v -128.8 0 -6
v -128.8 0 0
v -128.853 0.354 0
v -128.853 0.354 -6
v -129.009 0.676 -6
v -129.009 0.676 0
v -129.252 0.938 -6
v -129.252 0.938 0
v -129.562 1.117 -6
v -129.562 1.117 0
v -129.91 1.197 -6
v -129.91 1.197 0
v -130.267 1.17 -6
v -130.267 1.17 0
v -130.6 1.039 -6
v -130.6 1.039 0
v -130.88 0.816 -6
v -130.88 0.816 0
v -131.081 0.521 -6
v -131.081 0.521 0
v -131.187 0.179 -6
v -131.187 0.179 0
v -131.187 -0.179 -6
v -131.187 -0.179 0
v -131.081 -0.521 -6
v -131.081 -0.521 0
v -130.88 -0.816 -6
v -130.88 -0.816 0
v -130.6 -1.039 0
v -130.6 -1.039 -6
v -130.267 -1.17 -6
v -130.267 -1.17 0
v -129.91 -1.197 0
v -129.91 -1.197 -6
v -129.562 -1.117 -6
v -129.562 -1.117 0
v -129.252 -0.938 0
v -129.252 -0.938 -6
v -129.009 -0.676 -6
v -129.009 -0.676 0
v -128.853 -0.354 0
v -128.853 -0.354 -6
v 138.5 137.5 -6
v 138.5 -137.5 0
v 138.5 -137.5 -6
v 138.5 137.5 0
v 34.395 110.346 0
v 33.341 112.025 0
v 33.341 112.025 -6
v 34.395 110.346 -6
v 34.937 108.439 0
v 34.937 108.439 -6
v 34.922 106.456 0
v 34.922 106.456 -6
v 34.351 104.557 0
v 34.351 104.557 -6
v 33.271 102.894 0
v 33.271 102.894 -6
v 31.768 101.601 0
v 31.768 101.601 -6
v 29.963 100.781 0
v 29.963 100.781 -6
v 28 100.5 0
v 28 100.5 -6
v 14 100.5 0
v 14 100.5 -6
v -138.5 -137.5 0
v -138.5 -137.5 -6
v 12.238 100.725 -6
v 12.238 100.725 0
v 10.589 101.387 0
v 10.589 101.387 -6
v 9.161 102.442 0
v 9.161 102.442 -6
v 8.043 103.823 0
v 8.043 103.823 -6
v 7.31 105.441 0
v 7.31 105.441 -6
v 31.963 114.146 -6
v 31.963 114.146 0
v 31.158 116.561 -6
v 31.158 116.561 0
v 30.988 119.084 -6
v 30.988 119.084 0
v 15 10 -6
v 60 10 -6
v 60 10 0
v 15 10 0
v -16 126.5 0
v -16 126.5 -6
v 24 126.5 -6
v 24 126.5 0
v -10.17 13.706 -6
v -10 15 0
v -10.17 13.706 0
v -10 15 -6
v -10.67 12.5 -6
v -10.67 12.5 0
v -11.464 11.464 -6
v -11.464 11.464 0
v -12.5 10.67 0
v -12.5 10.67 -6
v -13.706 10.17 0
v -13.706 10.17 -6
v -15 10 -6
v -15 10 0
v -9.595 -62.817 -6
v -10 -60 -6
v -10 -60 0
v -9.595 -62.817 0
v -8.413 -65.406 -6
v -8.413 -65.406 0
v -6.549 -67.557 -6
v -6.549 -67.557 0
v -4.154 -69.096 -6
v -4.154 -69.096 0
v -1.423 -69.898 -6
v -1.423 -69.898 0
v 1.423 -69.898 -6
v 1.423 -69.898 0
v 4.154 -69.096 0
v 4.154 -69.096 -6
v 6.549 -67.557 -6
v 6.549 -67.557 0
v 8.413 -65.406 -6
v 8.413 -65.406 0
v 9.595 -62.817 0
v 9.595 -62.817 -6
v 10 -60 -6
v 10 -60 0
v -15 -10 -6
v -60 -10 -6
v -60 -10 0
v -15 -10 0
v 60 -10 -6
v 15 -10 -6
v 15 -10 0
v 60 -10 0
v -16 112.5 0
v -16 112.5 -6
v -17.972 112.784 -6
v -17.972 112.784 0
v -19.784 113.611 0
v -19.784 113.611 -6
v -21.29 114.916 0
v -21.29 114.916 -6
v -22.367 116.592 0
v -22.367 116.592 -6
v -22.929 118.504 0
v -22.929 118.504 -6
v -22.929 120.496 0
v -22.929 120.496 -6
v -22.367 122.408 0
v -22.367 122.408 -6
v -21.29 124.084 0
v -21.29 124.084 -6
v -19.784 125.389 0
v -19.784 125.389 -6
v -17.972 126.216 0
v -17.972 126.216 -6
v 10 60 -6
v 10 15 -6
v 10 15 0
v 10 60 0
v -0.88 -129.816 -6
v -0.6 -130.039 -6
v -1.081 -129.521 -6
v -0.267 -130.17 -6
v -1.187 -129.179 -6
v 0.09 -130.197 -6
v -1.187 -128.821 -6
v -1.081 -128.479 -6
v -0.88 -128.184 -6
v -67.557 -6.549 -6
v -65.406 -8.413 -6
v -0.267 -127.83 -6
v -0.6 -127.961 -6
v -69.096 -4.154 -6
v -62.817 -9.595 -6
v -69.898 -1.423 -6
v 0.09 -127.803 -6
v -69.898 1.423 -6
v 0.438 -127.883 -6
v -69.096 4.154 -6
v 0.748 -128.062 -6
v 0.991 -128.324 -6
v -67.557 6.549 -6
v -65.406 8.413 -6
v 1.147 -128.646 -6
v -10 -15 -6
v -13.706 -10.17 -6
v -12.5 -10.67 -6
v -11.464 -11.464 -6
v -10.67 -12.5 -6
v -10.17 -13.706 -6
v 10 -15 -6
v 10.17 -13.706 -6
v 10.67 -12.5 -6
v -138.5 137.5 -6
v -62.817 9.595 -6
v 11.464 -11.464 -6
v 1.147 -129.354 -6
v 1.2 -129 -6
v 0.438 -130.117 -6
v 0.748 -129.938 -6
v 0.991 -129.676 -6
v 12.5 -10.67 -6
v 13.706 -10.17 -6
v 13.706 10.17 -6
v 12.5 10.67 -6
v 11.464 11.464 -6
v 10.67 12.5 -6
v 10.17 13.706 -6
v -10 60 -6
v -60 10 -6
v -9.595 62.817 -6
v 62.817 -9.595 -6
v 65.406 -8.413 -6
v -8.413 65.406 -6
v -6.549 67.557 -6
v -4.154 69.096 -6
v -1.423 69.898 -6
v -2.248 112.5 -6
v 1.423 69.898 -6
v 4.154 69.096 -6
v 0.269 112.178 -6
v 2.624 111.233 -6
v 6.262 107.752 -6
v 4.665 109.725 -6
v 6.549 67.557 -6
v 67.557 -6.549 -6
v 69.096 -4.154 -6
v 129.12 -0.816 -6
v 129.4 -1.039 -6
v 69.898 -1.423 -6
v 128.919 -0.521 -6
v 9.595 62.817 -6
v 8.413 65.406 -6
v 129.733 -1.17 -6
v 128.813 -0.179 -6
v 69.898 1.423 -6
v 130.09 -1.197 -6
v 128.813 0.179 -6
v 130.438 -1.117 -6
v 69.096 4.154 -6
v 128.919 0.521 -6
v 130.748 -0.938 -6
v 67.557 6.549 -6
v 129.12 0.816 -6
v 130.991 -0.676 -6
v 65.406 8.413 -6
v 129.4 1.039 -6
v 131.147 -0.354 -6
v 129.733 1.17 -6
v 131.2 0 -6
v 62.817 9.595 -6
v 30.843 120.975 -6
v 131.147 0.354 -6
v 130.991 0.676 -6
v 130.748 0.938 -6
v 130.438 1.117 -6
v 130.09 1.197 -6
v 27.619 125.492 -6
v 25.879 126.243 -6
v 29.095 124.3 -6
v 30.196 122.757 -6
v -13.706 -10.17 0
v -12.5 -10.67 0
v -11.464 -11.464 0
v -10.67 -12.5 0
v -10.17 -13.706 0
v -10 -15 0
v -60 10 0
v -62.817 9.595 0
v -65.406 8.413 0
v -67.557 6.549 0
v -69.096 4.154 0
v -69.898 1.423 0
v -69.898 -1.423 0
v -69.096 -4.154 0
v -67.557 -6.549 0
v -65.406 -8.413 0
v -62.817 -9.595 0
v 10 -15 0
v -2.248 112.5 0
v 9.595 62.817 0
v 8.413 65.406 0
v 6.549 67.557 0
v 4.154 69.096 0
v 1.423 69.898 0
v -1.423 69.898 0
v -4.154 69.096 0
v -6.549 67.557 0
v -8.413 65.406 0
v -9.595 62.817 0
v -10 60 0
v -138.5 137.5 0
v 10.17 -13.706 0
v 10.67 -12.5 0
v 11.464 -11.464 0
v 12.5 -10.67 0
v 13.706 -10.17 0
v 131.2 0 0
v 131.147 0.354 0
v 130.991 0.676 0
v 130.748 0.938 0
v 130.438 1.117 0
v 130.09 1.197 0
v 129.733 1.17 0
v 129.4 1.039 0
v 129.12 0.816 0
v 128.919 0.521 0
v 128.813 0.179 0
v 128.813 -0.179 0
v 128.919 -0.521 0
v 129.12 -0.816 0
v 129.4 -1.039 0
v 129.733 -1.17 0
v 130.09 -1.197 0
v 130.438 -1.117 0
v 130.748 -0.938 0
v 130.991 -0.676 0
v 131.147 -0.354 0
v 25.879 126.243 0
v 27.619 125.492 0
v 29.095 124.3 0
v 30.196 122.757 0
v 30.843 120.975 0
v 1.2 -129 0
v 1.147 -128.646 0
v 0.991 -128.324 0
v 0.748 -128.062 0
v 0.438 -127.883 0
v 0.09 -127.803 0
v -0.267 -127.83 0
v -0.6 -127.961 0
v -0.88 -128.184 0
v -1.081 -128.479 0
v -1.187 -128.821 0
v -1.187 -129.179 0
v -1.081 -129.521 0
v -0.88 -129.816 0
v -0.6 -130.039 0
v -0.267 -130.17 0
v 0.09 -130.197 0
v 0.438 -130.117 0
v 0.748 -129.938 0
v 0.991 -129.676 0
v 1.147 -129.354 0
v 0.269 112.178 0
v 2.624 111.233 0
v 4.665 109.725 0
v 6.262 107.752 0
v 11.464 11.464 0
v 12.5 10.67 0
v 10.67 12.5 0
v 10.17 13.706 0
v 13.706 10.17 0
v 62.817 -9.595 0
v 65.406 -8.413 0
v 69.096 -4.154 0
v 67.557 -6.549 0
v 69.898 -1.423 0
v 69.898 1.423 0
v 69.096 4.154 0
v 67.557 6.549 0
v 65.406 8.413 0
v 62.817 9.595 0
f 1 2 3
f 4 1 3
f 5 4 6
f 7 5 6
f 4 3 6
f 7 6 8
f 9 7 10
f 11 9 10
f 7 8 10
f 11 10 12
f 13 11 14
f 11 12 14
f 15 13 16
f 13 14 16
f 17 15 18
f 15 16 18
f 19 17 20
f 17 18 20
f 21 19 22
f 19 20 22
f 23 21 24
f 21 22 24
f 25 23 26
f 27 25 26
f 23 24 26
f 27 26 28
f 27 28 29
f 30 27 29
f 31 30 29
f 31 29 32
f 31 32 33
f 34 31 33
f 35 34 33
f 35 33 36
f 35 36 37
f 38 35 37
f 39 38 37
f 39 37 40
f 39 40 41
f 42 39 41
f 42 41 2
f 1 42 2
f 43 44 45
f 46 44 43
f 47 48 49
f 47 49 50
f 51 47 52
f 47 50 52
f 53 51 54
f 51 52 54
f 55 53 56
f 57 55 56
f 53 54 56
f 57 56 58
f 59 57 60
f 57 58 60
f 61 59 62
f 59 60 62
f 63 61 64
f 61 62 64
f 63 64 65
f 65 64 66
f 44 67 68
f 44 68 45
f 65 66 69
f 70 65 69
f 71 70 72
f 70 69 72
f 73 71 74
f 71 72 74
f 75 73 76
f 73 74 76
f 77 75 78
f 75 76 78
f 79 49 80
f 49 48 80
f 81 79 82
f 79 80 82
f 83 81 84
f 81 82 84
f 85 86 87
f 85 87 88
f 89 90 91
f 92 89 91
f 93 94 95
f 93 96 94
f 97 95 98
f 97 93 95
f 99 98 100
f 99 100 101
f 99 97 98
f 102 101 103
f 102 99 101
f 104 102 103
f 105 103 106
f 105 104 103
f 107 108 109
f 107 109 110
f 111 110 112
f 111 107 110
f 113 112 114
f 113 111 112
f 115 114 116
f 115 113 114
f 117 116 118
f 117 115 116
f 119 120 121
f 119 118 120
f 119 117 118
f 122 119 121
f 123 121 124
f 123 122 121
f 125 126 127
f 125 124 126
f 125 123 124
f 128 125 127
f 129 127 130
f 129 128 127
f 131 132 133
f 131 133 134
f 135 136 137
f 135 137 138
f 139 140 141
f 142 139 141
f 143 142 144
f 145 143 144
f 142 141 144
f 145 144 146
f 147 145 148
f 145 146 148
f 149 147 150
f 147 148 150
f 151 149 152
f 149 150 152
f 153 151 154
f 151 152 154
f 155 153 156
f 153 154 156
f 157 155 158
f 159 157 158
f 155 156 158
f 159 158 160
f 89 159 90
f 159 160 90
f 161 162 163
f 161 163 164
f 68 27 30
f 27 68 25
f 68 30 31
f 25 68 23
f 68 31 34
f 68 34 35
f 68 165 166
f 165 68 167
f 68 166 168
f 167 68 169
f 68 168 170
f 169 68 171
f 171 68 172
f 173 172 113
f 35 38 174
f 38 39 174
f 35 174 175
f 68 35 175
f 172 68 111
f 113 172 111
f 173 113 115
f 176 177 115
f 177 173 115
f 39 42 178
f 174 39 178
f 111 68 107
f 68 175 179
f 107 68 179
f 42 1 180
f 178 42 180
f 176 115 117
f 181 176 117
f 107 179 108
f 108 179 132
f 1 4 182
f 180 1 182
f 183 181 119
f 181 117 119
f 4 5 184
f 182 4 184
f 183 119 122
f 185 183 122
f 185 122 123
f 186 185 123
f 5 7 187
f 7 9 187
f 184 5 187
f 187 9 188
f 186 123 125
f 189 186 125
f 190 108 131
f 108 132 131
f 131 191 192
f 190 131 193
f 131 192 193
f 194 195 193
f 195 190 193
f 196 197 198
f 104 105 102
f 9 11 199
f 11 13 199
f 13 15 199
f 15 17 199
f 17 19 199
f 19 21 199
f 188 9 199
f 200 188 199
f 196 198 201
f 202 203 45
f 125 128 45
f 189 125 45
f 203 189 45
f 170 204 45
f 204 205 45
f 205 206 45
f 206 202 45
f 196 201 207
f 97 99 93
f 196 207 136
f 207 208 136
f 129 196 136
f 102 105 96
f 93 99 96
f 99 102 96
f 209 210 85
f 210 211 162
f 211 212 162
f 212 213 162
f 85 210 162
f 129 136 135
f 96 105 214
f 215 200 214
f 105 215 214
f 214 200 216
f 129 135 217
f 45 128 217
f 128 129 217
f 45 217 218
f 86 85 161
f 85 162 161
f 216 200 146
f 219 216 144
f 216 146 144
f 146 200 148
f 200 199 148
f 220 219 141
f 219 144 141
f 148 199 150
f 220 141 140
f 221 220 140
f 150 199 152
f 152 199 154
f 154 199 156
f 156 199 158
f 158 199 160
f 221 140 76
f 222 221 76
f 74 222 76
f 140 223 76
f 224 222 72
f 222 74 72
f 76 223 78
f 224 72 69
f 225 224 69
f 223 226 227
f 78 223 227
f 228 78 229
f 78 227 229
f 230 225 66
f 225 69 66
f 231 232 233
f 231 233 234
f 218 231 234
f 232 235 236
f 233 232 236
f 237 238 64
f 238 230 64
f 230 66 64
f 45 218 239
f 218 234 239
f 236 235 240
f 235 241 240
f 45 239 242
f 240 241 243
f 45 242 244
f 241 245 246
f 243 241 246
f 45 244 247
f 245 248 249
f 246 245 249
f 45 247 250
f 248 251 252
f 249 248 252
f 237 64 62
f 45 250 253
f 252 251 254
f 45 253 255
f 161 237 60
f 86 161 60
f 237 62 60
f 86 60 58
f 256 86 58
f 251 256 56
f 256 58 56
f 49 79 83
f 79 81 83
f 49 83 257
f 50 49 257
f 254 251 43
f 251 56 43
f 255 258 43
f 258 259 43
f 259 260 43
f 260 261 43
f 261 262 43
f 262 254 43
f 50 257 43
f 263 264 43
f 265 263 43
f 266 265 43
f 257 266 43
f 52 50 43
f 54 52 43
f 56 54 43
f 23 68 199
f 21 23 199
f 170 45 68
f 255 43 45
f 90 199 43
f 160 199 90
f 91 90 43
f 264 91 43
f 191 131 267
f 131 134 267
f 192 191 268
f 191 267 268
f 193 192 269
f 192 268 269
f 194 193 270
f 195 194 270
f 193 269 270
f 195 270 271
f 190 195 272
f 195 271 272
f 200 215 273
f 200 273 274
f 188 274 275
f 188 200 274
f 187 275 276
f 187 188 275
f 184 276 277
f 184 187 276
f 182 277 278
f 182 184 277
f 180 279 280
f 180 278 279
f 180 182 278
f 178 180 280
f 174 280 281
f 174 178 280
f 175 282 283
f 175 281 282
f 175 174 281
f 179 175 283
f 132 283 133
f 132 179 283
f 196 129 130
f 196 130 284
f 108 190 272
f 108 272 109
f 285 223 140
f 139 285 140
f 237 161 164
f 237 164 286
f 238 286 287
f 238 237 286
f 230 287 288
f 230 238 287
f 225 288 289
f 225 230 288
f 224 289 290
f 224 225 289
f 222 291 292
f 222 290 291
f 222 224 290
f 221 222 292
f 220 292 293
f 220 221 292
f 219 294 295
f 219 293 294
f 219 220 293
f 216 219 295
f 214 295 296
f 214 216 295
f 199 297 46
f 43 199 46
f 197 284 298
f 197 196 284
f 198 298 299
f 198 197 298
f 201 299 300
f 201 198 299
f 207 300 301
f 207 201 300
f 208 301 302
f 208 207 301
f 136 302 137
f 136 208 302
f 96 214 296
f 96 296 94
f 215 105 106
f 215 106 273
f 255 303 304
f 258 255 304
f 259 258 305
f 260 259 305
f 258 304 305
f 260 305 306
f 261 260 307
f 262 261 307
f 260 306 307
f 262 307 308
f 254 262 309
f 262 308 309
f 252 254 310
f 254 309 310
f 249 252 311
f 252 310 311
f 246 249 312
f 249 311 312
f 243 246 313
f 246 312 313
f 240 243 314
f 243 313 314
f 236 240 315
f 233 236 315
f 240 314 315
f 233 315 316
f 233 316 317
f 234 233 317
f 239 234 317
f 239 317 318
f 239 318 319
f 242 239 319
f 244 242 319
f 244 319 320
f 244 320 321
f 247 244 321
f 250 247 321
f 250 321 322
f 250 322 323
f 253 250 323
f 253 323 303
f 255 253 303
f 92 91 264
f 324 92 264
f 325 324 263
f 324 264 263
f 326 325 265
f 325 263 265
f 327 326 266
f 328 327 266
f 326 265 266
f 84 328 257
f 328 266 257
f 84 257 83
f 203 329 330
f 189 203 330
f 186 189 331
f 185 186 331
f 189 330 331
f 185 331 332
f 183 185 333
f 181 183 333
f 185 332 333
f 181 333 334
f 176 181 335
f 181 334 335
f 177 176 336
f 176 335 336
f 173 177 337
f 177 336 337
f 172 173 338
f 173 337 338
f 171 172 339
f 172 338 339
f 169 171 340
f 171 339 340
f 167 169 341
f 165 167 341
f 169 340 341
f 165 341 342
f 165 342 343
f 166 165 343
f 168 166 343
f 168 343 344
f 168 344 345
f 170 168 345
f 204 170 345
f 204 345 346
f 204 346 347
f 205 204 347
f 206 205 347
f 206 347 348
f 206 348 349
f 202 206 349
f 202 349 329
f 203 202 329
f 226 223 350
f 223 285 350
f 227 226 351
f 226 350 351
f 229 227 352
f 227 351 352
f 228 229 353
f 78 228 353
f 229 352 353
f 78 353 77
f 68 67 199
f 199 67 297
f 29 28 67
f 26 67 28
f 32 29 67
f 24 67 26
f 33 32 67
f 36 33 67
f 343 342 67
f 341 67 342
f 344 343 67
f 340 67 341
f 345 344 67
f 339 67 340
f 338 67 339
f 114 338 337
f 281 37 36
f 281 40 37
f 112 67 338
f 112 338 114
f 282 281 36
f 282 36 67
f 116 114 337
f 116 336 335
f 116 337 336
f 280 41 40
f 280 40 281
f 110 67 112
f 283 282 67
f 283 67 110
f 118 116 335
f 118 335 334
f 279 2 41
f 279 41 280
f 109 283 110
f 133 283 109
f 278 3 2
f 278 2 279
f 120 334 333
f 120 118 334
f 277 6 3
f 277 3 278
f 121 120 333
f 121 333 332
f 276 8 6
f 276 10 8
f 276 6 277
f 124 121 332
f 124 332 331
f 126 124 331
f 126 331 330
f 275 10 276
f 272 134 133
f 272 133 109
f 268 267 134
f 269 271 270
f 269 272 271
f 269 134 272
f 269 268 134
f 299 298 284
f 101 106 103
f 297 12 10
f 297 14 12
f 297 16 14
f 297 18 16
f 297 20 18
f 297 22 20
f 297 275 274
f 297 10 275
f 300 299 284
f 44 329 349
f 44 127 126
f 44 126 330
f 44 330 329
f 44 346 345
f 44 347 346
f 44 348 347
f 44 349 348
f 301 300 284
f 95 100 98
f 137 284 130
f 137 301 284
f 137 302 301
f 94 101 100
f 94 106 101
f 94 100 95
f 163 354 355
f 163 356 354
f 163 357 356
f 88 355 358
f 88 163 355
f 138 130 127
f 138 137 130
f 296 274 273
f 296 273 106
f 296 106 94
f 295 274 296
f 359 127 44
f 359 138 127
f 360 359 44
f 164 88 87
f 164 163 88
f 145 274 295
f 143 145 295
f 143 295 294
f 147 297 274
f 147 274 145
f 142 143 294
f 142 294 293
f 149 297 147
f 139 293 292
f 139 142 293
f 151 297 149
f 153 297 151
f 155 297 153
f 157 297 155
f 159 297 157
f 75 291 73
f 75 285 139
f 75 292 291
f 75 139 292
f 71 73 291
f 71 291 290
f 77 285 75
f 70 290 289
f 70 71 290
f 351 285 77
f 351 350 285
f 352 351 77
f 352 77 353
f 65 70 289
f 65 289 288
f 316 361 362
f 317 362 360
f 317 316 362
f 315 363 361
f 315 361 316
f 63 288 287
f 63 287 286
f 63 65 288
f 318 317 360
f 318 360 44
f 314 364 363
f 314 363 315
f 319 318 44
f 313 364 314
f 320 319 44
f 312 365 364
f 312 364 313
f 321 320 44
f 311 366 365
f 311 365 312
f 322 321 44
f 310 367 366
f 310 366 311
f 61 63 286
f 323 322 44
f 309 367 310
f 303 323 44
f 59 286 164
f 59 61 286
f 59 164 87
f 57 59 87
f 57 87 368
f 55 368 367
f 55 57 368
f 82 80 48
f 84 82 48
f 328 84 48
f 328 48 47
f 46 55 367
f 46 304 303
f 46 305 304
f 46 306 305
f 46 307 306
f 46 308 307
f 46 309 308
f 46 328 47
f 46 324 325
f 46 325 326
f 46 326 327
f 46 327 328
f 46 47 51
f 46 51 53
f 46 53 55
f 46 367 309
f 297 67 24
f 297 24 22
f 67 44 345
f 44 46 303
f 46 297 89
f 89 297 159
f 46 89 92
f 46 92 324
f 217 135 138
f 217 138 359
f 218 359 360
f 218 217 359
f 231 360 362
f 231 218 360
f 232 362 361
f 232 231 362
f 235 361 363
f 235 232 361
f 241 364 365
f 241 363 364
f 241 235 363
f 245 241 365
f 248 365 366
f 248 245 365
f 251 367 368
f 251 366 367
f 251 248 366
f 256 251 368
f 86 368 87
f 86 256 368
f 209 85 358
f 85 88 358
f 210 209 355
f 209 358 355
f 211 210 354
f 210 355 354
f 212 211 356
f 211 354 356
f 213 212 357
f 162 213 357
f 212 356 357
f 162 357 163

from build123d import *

# Parameters (mm, degrees)
CROQUIS1_W                   = 277
CROQUIS1_H                   = 275
BRIDA_BASE1_DEPTH            = 6
CORTAR_EXTRUIR4_DEPTH        = 10
REDONDEO2_R                  = 10
TALADRO_DE_MARGEN_PARA_M21_D = 2.4
CORTAR_EXTRUIR5_DEPTH        = 196.254961669
MATRIZC1_COUNT               = 4
REDONDEO3_R                  = 5


# Sheet-metal steps are written as plain solids
with BuildPart() as part:
    # Croquis1 → Brida base1 (new body)
    with BuildSketch(Plane.XY):
        Rectangle(CROQUIS1_W, CROQUIS1_H)
    extrude(amount=-BRIDA_BASE1_DEPTH)

    # Croquis6 → Cortar-Extruir4 (cut)
    with BuildSketch(Plane(origin=(0, 0, -6), x_dir=(-1, 0, 0), z_dir=(0, 0, -1))):
        with BuildLine():
            Line((-9.101020514, 112.5), (16, 112.5))
            ThreePointArc((16, 112.5), (23, 119.5), (16, 126.5))
            Line((16, 126.5), (-24, 126.5))
            ThreePointArc((-24, 126.5), (-30.494583009, 122.111587935), (-28.846049894, 114.448683298))
            ThreePointArc((-28.846049894, 114.448683298), (-28.423802379, 114.487159047), (-28, 114.5))
            Line((-28, 114.5), (-14, 114.5))
            ThreePointArc((-14, 114.5), (-11.354248689, 113.980740698), (-9.101020514, 112.5))
        make_face()
        with BuildLine():
            ThreePointArc((-14, 100.5), (-7.519259302, 104.854248689), (-9.101020514, 112.5))
            Line((-9.101020514, 112.5), (-24, 112.5))
            ThreePointArc((-24, 112.5), (-26.611587935, 113.005416991), (-28.846049894, 114.448683298))
            ThreePointArc((-28.846049894, 114.448683298), (-34.987159047, 107.076197621), (-28, 100.5))
            Line((-28, 100.5), (-14, 100.5))
        make_face()
        with BuildLine():
            Line((-24, 112.5), (-9.101020514, 112.5))
            ThreePointArc((-9.101020514, 112.5), (-11.354248689, 113.980740698), (-14, 114.5))
            Line((-14, 114.5), (-28, 114.5))
            ThreePointArc((-28, 114.5), (-28.423802379, 114.487159047), (-28.846049894, 114.448683298))
            ThreePointArc((-28.846049894, 114.448683298), (-26.611587935, 113.005416991), (-24, 112.5))
        make_face()
    extrude(amount=-CORTAR_EXTRUIR4_DEPTH, mode=Mode.SUBTRACT)

    # Redondeo2
    redondeo2_edges = [part.edges().sort_by_distance(p)[0] for p in [
        (28.846049894, 114.448683298, -3),
        (9.101020514, 112.5, -3),
    ]]
    fillet(redondeo2_edges, radius=REDONDEO2_R)

    # Taladro de margen para M21 (through all)
    with Locations(Plane(origin=(0, 0, -6), x_dir=(-1, 0, 0), z_dir=(0, 0, -1))):
        with Locations((-130, 0), (130, 0), (0, -129)):
            Hole(TALADRO_DE_MARGEN_PARA_M21_D / 2)

    # Croquis16 → Cortar-Extruir5 (cut, through all)
    with BuildSketch(Plane(origin=(0, 0, -6), x_dir=(-1, 0, 0), z_dir=(0, 0, -1))):
        with BuildLine():
            Line((10, 60), (10, -60))
            ThreePointArc((10, -60), (0, -70), (-10, -60))
            Line((-10, -60), (-10, 60))
            ThreePointArc((-10, 60), (0, 70), (10, 60))
        make_face()
    cortar_extruir5 = extrude(amount=-CORTAR_EXTRUIR5_DEPTH, mode=Mode.SUBTRACT)

    # MatrizC1: Cortar-Extruir5 ×4 about axis
    matrizc1_axis = Axis((0, 0, 0), (0, 0, 1))
    for i in range(1, MATRIZC1_COUNT):
        add(cortar_extruir5.rotate(matrizc1_axis, i * 360 / MATRIZC1_COUNT), mode=Mode.SUBTRACT)

    # Redondeo3
    redondeo3_edges = [part.edges().sort_by_distance(p)[0] for p in [
        (10, 10, -3),
        (10, -10, -3),
        (-10, 10, -3),
        (-10, -10, -3),
    ]]
    fillet(redondeo3_edges, radius=REDONDEO3_R)


solid = part.part
